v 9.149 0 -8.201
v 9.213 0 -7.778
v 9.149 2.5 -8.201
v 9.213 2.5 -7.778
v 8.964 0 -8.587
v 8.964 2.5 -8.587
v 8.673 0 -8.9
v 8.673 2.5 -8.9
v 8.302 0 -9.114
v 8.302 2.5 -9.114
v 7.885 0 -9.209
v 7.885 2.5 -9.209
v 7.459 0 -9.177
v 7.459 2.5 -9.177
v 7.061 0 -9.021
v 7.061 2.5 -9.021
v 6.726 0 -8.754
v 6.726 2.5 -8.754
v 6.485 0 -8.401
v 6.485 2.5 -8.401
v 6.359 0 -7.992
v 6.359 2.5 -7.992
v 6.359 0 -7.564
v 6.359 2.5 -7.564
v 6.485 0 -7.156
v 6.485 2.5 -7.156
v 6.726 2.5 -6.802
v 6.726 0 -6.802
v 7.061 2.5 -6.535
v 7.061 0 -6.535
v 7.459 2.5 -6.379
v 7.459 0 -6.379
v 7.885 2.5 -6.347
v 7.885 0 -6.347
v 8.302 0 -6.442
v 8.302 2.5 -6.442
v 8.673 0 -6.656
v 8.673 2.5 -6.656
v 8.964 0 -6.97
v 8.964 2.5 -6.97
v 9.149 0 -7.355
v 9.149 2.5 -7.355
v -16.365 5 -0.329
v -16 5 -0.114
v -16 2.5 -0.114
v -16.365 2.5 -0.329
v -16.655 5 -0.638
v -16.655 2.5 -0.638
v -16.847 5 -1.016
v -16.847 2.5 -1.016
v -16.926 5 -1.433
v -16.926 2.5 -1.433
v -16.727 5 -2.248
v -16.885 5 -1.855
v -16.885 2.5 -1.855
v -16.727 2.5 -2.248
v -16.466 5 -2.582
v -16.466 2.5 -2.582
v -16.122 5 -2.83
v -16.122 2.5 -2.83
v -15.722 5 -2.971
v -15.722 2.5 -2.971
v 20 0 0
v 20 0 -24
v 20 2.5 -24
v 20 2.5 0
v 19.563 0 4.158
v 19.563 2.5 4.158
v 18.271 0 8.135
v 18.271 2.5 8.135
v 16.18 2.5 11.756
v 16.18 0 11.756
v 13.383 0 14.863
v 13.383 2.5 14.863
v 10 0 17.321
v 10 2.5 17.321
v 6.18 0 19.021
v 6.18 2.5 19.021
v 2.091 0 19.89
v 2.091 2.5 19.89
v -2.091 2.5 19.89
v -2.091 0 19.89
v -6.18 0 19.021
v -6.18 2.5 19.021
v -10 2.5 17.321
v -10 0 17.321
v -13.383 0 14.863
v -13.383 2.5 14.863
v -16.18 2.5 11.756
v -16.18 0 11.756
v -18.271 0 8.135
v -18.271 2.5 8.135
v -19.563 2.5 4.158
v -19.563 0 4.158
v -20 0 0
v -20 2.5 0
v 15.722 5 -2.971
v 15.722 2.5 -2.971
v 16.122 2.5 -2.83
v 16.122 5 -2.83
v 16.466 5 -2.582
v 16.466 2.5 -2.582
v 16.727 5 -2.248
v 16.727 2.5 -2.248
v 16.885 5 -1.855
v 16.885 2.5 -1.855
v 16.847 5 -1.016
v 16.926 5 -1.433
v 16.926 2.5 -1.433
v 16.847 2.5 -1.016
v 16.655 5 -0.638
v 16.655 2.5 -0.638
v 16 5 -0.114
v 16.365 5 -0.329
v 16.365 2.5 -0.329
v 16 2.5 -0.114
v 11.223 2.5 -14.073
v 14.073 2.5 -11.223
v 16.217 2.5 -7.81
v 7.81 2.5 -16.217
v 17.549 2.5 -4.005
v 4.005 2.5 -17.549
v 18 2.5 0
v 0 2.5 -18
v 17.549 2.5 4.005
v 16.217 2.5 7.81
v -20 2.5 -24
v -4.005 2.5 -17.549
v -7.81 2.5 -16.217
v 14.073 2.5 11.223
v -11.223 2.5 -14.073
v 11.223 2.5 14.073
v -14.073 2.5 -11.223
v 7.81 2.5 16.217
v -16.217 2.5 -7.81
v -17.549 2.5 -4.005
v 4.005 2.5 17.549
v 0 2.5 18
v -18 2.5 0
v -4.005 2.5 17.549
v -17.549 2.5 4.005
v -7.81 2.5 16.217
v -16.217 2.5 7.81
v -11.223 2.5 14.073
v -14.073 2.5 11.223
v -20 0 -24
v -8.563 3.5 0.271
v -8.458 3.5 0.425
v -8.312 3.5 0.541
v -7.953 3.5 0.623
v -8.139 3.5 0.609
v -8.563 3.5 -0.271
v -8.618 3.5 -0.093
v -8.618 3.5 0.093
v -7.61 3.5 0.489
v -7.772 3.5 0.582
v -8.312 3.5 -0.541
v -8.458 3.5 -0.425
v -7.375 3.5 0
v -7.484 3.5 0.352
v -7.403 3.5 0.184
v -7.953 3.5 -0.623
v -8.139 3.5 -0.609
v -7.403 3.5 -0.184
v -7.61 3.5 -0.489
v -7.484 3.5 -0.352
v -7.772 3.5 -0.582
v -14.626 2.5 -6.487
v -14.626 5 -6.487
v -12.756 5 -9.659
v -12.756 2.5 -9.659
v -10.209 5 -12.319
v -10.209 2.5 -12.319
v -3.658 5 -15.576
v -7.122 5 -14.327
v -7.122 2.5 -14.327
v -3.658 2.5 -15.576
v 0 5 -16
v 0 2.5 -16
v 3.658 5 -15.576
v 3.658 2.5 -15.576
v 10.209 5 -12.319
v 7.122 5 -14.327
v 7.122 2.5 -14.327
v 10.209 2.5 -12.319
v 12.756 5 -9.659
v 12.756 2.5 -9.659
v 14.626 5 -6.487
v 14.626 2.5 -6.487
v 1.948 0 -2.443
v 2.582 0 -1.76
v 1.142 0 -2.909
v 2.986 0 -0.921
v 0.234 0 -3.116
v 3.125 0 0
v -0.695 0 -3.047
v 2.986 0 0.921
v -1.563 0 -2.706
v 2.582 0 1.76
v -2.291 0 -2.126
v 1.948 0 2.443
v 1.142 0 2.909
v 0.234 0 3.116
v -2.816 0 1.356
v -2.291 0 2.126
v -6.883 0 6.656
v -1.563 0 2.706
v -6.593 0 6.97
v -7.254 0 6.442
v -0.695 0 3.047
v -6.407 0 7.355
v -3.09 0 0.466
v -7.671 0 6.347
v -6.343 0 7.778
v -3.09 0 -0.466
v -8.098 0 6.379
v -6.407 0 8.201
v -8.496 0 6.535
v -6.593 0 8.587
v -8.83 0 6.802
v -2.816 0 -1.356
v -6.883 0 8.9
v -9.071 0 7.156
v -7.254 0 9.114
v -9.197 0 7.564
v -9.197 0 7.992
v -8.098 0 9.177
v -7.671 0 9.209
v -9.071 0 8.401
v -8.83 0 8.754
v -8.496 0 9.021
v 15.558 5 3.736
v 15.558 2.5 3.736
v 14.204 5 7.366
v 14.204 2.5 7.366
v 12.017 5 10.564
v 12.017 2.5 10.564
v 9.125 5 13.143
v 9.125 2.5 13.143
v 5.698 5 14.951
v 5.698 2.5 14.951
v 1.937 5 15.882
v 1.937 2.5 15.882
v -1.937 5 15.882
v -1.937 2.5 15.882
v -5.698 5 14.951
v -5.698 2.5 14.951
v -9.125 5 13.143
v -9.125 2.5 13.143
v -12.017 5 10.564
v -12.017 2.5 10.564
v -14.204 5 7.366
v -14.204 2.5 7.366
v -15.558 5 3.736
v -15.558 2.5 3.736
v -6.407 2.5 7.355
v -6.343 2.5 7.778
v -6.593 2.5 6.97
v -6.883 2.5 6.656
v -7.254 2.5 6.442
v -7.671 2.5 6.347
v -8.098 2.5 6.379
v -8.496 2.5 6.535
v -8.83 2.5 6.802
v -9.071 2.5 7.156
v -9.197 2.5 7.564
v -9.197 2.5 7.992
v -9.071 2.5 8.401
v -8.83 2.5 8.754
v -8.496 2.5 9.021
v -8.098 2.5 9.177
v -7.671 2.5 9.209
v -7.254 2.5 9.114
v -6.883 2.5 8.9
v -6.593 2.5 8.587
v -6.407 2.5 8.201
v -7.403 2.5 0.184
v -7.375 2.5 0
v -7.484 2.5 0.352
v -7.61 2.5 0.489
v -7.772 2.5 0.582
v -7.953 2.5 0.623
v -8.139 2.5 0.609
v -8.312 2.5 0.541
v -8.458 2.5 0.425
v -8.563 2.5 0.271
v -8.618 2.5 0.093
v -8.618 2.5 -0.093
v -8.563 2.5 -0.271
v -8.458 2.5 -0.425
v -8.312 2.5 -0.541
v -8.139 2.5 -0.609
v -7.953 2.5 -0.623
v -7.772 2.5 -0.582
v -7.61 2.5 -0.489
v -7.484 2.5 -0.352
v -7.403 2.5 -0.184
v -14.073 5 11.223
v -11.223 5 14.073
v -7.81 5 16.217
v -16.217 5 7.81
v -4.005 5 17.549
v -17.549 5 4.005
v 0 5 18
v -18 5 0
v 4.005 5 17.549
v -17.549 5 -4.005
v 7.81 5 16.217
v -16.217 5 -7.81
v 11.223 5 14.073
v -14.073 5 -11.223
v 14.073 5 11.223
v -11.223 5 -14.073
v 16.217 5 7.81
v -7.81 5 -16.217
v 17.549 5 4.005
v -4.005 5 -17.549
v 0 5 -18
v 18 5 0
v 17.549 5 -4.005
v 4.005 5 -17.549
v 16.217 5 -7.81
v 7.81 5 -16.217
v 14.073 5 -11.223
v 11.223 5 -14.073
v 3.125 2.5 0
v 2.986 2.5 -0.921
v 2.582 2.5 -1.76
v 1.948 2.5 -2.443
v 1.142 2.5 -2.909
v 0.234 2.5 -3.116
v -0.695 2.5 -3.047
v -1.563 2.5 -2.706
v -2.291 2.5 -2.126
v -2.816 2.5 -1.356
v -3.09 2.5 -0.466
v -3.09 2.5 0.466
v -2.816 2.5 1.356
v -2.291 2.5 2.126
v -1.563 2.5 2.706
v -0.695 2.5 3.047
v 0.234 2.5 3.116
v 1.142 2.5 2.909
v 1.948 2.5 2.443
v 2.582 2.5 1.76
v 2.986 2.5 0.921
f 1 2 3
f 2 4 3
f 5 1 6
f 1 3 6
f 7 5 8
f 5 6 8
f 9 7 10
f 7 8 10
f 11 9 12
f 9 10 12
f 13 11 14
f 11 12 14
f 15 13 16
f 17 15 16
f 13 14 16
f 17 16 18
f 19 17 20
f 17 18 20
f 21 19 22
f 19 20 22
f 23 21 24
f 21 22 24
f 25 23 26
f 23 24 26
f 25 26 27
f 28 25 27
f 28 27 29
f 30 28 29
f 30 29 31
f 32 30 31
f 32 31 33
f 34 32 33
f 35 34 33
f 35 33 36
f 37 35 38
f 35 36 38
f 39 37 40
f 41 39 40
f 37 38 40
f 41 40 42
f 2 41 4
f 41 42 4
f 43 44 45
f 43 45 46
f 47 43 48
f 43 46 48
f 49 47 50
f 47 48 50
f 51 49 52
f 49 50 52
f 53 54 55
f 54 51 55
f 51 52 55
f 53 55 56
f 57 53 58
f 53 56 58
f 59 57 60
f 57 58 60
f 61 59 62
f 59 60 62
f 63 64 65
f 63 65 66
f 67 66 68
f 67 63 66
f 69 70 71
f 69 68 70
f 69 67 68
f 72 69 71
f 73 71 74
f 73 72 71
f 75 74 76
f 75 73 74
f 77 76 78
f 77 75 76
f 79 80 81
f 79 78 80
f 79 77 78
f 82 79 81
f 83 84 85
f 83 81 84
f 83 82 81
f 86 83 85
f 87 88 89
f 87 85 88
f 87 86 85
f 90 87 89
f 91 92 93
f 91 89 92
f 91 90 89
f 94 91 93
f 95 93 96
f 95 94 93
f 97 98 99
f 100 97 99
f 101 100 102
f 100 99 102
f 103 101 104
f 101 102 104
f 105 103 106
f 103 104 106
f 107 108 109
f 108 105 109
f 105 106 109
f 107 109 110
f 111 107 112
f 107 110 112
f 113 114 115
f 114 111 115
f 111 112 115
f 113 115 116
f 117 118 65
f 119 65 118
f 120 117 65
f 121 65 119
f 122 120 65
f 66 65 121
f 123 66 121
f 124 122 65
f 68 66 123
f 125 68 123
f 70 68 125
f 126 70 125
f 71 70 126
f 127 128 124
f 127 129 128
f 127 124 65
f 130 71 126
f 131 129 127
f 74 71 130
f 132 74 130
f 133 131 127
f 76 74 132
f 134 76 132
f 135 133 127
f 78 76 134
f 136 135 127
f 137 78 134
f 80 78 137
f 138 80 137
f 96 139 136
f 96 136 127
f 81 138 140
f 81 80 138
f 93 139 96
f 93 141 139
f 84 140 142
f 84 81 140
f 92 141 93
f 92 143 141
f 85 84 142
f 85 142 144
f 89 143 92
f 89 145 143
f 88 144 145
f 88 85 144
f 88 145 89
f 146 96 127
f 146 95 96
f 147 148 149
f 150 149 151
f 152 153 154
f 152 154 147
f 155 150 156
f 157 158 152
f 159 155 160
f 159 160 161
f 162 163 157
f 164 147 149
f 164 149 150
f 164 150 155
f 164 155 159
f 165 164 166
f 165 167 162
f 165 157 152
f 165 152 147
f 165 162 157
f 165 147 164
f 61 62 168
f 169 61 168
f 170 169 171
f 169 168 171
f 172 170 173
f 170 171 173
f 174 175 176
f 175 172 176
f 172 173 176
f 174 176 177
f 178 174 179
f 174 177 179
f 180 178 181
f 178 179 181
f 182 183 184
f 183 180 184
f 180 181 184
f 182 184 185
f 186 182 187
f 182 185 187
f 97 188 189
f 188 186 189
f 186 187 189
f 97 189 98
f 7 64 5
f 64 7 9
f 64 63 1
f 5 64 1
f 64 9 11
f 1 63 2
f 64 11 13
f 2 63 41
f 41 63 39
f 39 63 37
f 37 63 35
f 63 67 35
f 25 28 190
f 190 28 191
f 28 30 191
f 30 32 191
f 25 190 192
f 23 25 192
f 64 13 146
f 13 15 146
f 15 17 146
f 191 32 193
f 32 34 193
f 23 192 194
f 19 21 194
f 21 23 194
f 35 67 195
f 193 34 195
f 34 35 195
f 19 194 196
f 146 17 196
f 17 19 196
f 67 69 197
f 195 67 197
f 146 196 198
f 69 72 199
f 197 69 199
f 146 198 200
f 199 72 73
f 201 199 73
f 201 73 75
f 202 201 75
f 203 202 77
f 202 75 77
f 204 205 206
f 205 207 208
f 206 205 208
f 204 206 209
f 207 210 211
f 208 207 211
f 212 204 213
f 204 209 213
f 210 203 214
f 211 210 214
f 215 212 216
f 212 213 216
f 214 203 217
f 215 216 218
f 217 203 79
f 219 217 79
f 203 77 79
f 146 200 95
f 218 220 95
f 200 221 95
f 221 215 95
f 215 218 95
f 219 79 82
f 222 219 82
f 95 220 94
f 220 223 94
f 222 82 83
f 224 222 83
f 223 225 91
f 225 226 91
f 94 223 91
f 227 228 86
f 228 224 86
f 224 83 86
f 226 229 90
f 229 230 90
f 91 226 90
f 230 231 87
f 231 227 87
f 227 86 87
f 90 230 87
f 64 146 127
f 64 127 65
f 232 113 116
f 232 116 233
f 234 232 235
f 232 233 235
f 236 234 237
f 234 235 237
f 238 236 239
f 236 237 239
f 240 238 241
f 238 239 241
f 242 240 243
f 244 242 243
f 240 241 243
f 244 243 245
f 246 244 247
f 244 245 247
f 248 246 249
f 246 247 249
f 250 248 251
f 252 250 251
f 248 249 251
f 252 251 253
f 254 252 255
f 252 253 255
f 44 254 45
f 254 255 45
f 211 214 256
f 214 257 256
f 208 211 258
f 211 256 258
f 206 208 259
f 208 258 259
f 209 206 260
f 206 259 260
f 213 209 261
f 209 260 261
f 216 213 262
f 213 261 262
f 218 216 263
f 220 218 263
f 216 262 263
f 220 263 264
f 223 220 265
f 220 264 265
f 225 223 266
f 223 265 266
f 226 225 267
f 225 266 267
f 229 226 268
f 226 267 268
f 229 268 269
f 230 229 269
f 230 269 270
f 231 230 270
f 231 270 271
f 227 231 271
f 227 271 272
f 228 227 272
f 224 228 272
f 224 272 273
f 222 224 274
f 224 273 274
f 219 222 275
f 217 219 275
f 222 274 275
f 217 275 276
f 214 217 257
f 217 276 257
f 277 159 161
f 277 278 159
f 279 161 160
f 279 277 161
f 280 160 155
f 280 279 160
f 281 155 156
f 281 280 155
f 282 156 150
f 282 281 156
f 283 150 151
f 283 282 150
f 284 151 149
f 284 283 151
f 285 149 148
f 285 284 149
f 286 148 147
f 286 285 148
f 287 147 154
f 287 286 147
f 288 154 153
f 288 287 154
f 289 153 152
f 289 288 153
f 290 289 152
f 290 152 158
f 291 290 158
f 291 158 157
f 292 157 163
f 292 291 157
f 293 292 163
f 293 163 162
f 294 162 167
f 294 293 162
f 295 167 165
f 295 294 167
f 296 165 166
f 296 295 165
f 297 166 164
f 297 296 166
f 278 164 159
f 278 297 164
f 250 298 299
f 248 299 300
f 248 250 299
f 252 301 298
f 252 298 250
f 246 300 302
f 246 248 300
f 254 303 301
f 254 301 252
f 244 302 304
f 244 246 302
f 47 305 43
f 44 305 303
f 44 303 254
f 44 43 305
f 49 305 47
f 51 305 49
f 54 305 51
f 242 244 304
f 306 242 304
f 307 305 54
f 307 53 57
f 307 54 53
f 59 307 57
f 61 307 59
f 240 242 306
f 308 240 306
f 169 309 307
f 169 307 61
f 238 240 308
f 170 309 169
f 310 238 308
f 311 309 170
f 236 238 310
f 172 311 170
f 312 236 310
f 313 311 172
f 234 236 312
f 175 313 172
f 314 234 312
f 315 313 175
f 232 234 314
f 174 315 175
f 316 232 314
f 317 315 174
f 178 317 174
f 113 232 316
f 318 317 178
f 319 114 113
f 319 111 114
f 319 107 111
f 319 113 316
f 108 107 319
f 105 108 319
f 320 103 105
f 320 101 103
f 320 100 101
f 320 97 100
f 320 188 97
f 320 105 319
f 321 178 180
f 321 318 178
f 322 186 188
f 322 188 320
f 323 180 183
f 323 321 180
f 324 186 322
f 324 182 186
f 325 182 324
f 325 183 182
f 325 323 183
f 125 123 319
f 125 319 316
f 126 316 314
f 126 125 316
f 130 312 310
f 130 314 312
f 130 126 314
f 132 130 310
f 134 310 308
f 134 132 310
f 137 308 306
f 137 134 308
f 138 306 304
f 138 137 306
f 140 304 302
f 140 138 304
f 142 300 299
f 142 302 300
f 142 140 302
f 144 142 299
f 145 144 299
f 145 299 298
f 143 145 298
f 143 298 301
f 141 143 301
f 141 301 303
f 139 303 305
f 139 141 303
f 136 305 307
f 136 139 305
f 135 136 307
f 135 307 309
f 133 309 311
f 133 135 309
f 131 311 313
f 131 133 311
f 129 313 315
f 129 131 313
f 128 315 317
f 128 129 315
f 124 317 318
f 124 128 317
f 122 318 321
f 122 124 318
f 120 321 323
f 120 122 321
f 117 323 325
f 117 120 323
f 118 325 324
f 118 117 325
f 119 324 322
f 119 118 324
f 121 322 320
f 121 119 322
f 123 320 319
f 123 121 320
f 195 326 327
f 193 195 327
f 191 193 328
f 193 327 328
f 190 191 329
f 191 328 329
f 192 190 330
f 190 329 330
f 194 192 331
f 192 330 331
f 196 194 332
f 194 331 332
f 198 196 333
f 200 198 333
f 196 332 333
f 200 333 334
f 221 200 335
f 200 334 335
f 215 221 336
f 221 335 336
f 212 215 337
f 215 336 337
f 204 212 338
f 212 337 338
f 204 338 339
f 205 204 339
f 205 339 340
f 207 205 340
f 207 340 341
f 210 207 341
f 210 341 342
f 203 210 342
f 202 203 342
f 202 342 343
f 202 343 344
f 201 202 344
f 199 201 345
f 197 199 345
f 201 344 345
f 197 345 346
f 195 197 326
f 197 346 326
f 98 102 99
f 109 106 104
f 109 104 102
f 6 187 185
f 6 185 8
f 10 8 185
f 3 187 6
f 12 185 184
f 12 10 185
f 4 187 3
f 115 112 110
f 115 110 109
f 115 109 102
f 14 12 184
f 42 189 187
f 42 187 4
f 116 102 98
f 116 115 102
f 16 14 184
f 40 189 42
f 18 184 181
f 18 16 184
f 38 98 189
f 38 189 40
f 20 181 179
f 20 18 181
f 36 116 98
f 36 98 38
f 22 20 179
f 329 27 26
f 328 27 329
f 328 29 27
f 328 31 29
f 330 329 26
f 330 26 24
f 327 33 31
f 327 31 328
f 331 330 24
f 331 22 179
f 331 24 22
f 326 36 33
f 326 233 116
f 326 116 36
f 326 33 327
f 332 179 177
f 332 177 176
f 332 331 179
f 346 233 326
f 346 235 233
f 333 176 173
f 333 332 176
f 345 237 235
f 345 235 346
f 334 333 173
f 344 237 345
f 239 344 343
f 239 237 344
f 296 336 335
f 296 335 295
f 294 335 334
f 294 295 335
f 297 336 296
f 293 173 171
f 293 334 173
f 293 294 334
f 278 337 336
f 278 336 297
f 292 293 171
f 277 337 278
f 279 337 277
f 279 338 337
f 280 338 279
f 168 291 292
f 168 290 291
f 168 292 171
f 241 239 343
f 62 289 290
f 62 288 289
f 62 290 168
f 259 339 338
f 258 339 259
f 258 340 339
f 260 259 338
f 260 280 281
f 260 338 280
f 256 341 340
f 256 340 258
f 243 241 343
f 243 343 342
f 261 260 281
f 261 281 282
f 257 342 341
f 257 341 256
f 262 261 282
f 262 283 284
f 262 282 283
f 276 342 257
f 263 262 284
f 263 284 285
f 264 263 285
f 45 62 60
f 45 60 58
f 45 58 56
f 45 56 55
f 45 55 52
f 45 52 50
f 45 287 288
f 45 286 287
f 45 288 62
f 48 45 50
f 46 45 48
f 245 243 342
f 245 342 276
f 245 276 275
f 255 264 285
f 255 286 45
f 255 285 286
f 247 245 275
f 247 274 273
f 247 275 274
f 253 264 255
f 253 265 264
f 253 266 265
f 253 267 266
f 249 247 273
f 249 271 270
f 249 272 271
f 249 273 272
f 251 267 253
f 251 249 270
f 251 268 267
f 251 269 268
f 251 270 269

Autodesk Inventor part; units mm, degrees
ref_plane "YZ Plane" through (0, 0, 0) normal (1, 0, 0) x (0, 1, 0)
ref_plane "XZ Plane" through (0, 0, 0) normal (0, 1, 0) x (-1, 0, 0)
ref_plane "XY Plane" through (0, 0, 0) normal (0, 0, 1) x (1, 0, 0)
sketch "Sketch1" plane through (0, 0, 0) normal (0, 1, 0) x (-1, 0, 0)
  arc A0 (20, 0) -> (-20, 0) centre (0, 0) ccw
  line L0 (20, 0) -> (20, -24)
  line L1 (20, -24) -> (-20, -24)
  line L2 (-20, -24) -> (-20, 0)
  dimension "d0" = 40
  dimension "d1" = 44
extrude "Extrusion1" add sketch "Sketch1" along normal blind 2.5
sketch "Sketch2" plane through (0, 2.5, 0) normal (0, 1, 0) x (1, 0, 0)
  arc A0 (-20, 0) -> (20, 0) centre (0, 0) ccw projected
  circle A1 centre (0, 0) radius 18
  circle A2 centre (0, 0) radius 16
  arc A3 (-15.7218, 2.9708) -> (-15.9996, 0.1135) centre (-15.4272, 1.5) ccw
  arc A4 (15.9996, 0.1135) -> (15.7218, 2.9708) centre (15.4272, 1.5) ccw
  line L0 (-15.9249, 1.5484) -> (-16.9202, 1.6452) construction
  line L1 (16.9202, 1.6452) -> (15.9249, 1.5484) construction
  dimension "d4" = 36
  dimension "d7" = 2
  dimension "d8" = 3
  dimension "d9" = 1
  dimension "d10" = 1.5
extrude "Extrusion2" add sketch "Sketch2" along normal blind 2.5
sketch "Sketch3" plane through (0, 2.5, 0) normal (0, 1, 0) x (1, 0, 0)
  arc A0 (-15.9996, 0.1135) -> (15.9996, 0.1135) centre (0, 0) ccw projected
  circle A1 centre (0, 0) radius 3.125
  dimension "d13" = 6.25
extrude "Extrusion3" cut sketch "Sketch3" against normal through all
sketch "Sketch4" plane through (0, 2.5, 0) normal (0, 1, 0) x (1, 0, 0)
  circle A0 centre (0, 0) radius 3.125 projected
  circle A1 centre (-8, 0) radius 0.625
  dimension "d16" = 1.25
  dimension "d18" = 8
extrude "Extrusion4" add sketch "Sketch4" along normal blind 1 contours A1
sketch "Sketch5" plane through (0, 2.5, 0) normal (0, 1, 0) x (1, 0, 0)
  circle A0 centre (0, 0) radius 3.125 projected
  circle A1 centre (7.7782, 7.7782) radius 1.435
  circle A2 centre (-7.7782, -7.7782) radius 1.435
  line L0 (7.7782, 7.7782) -> (-7.7782, -7.7782) construction
  line L1 (20, 24) -> (-20, 24) construction
  dimension "d21" = 2.87
  dimension "d23" = 22
  dimension "d24" = 45
extrude "Extrusion5" cut sketch "Sketch5" against normal through all contours A1 | A2
properties part number "WhitePumpBase"
